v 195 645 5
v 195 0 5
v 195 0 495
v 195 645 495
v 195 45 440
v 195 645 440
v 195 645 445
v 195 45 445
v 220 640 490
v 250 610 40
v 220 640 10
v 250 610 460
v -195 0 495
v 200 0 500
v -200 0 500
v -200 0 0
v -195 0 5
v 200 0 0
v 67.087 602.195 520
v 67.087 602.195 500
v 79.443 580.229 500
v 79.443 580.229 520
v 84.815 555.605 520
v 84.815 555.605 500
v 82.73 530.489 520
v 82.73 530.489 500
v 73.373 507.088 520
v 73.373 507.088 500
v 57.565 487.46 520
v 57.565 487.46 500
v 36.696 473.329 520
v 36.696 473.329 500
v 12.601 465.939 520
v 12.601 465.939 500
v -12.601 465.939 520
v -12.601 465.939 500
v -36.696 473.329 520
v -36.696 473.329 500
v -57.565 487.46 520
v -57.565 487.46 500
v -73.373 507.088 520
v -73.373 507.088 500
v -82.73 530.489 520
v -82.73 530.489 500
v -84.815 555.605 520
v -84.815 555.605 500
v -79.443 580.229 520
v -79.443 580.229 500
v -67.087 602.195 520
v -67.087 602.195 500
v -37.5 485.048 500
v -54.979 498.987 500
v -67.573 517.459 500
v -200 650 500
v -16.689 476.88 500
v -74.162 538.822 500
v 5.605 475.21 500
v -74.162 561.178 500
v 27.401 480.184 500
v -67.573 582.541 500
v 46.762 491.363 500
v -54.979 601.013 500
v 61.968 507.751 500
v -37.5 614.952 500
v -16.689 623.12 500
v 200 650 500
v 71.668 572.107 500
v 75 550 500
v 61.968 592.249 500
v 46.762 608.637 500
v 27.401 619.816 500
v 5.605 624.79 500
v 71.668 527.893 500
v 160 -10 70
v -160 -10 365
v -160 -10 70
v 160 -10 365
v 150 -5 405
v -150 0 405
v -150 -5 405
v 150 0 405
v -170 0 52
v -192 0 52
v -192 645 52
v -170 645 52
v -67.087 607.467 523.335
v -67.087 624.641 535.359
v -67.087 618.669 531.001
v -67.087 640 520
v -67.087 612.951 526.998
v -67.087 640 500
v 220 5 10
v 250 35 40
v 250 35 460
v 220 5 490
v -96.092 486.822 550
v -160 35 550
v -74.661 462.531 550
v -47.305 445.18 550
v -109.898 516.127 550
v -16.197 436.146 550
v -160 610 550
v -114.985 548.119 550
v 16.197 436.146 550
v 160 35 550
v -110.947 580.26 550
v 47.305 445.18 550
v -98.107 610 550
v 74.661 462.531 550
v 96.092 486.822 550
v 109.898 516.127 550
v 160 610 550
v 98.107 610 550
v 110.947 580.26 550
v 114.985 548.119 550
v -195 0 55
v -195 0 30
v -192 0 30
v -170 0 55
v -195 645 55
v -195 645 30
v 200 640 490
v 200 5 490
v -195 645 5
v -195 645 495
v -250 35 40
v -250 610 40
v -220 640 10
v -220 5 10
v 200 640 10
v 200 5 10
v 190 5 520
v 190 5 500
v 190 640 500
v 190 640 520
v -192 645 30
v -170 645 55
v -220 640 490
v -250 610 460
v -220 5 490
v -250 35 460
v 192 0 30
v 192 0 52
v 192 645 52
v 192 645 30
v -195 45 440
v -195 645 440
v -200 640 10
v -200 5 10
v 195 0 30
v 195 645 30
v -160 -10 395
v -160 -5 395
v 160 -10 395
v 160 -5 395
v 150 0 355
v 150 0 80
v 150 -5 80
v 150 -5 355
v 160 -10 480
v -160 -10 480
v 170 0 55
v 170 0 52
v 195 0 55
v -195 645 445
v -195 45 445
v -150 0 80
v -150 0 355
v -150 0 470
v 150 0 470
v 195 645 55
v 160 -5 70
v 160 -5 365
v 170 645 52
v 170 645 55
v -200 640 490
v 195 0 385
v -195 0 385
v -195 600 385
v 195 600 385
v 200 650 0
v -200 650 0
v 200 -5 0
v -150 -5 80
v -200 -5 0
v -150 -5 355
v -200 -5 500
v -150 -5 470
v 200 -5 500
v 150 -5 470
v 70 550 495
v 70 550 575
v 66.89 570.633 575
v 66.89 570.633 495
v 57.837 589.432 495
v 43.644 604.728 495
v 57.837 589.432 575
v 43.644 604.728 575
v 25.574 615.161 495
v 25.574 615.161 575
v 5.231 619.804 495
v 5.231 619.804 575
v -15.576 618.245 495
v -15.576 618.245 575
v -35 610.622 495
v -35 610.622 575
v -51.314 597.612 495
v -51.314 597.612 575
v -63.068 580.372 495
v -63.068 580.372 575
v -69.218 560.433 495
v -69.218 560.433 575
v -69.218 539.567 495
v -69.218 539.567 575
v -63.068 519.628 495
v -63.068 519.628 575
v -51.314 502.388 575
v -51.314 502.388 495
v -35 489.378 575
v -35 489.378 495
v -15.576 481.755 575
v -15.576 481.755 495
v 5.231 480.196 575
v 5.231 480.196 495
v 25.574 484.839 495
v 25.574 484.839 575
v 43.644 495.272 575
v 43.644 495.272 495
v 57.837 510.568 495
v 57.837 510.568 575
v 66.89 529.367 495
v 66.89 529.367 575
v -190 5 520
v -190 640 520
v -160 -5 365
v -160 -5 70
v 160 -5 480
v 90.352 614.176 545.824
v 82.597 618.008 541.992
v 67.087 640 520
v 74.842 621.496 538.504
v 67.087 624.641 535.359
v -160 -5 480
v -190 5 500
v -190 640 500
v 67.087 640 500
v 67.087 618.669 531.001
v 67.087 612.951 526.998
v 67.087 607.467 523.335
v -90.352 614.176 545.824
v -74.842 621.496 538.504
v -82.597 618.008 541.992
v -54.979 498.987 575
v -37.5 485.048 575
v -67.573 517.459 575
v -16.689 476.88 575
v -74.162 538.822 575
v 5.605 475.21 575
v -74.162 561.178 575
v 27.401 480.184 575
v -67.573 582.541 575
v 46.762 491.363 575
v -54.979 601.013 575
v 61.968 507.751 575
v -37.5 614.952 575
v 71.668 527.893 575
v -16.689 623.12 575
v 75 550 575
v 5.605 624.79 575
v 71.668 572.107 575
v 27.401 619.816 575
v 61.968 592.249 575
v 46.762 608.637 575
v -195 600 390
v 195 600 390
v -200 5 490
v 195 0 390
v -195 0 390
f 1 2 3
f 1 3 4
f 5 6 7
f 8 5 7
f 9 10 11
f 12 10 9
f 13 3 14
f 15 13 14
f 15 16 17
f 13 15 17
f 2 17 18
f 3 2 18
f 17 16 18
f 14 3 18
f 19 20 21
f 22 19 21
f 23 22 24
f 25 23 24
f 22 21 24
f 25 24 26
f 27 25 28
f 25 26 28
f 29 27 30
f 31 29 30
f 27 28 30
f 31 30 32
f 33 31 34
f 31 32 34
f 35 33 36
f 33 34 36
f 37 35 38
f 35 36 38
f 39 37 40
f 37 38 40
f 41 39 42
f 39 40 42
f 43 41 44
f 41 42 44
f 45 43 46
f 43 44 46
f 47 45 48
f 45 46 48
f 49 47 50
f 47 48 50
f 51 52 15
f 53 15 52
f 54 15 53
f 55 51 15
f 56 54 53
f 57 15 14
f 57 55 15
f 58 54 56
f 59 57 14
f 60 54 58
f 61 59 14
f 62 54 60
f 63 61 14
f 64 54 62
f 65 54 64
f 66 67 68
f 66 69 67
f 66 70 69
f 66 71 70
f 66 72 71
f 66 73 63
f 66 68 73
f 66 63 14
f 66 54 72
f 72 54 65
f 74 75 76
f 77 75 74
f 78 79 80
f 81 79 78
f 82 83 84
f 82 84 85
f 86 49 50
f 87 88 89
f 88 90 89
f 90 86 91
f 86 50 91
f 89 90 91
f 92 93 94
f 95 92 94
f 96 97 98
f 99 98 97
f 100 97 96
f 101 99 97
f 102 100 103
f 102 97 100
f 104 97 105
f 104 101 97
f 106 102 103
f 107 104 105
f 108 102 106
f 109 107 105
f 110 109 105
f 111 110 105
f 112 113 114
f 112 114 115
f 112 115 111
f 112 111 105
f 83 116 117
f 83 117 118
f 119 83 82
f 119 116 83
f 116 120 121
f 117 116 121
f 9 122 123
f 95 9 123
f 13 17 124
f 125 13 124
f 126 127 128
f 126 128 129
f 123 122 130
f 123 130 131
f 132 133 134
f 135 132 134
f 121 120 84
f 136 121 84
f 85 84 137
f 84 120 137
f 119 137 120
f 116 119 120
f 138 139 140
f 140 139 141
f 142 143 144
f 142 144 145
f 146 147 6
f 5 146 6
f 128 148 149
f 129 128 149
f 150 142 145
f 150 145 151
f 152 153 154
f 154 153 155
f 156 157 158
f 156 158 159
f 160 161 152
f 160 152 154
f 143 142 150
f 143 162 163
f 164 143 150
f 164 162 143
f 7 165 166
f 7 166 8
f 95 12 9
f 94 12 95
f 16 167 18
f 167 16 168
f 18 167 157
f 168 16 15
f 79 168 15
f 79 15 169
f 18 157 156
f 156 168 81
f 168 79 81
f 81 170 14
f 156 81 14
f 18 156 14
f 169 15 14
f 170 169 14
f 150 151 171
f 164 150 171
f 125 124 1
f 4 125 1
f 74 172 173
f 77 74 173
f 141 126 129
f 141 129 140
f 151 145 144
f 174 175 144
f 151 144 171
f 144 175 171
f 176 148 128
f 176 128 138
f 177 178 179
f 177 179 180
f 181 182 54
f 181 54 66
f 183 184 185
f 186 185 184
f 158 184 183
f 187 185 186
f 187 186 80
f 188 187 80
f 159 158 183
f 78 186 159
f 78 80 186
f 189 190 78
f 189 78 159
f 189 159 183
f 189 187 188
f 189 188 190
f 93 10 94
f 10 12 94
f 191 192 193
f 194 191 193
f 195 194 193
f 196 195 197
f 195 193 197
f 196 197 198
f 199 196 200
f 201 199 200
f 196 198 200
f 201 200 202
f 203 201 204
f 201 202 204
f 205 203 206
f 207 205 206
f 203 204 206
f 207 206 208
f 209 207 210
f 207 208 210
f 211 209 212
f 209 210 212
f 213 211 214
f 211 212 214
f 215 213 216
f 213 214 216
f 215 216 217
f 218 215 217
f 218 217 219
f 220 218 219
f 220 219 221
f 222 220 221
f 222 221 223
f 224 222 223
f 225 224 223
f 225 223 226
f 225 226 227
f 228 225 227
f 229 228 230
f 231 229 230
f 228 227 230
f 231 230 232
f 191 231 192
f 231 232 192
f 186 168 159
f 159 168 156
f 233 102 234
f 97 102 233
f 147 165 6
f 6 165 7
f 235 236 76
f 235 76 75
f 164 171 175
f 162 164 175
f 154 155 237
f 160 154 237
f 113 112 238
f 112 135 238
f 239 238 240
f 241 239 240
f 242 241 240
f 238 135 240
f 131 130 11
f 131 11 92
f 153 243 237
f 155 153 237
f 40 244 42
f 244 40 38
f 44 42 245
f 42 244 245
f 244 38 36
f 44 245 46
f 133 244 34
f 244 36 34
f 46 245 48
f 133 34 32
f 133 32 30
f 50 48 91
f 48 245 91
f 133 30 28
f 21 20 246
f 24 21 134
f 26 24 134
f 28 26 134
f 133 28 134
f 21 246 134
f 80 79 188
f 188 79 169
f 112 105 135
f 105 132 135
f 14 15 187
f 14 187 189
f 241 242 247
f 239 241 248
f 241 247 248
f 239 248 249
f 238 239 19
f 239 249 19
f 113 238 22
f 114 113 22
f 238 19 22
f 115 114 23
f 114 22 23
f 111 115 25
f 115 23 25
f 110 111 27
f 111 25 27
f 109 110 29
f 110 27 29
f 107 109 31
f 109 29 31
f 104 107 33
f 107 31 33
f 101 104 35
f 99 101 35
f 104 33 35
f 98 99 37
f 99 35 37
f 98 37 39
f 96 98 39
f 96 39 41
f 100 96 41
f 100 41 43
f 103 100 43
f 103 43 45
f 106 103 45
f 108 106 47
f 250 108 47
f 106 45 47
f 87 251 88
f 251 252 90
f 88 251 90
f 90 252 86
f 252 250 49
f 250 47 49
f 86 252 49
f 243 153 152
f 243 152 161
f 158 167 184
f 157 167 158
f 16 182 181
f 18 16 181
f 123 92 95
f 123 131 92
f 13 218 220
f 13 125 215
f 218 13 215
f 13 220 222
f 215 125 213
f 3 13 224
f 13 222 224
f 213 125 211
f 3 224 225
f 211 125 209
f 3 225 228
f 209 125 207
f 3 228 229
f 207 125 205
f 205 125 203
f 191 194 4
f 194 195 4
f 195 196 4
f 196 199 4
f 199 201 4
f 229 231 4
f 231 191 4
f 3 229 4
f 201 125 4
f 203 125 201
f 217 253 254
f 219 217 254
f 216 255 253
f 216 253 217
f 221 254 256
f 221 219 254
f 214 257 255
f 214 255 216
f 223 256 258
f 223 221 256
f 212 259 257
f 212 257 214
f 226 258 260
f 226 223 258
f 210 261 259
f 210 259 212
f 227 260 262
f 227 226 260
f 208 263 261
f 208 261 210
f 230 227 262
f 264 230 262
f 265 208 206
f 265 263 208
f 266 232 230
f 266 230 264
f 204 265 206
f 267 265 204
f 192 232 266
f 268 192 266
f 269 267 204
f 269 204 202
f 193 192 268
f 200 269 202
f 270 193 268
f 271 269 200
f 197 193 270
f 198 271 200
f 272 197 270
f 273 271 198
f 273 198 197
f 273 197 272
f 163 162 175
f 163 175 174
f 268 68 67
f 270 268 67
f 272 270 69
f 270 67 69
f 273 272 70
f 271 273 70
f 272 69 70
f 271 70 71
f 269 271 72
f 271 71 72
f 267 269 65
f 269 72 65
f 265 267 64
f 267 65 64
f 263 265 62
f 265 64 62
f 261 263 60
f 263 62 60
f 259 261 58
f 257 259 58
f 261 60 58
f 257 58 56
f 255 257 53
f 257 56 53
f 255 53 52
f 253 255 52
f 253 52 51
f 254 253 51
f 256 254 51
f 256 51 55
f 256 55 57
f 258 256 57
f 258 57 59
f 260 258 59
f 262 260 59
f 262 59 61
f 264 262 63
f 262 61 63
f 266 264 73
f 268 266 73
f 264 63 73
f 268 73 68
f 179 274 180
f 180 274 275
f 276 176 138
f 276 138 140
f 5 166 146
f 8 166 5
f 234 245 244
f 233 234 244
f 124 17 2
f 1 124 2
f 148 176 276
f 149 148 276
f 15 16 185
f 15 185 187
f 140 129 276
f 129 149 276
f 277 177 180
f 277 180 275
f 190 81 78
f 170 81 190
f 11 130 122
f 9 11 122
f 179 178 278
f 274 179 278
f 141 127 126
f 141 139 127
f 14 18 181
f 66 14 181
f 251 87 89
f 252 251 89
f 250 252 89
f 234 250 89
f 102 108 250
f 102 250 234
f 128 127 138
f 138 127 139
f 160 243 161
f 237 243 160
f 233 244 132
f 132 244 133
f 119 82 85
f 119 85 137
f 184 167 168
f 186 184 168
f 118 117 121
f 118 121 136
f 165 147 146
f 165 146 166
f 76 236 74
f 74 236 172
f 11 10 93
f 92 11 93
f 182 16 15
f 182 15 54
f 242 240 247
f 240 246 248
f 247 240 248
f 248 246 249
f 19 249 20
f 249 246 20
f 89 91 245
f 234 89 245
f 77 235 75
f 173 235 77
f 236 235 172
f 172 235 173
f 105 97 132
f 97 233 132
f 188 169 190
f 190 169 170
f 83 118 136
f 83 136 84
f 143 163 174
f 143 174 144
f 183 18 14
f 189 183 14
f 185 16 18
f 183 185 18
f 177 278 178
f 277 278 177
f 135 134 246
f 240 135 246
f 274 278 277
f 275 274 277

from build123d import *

# Parameters (mm, degrees)
F1_W          = 400
F1_H          = 650
F2_DEPTH      = 500
F3_T          = -5
F4_W          = 390
F4_H          = 5
F5_DEPTH      = 600
F6_W          = 390
F6_H          = 5
F7_DEPTH      = 600
F9_DEPTH      = 645
F10_R         = 75
F11_DEPTH     = 75
F12_R         = 70
F13_DEPTH     = 80
F14_W         = 400
F14_H         = 500
F14_W_2       = 300
F14_H_2       = 275
F14_H_3       = 65
F15_DEPTH     = 5
F16_W         = 320
F16_H         = 85
F17_DEPTH     = 5
F16_H_2       = 295
F18_W         = 635
F18_H         = 480
F19_DEPTH     = 50
F22_DEPTH     = 50
F23_C1_SIZE   = 30
F23_C2_SIZE   = 30
F23_C3_SIZE   = 30
F23_C4_SIZE   = 30
F23_2_C1_SIZE = 30
F23_2_C2_SIZE = 30
F23_2_C3_SIZE = 30
F23_2_C4_SIZE = 30
F23_2_C5_SIZE = 30
F23_2_C6_SIZE = 30
F23_3_C1_SIZE = 30
F23_3_C2_SIZE = 30
F23_3_C3_SIZE = 30
F23_3_C4_SIZE = 30


with BuildPart() as f2:
    # F1 (on Top) → F2 (new body)
    with BuildSketch(Plane.XY):
        with Locations((0, 325)):
            Rectangle(F1_W, F1_H)
    extrude(amount=F2_DEPTH)

    # F3
    f3_openings = [f2.faces().sort_by_distance(p)[0] for p in [
        (0, 0, 250),
    ]]
    offset(amount=F3_T, openings=f3_openings)

    # F10 (on face) → F11 (join)
    with BuildSketch(Plane.XY.offset(500)):
        with Locations((0, 550)):
            Circle(F10_R)
    extrude(amount=F11_DEPTH)

    # F12 (on face) → F13 (cut, through all)
    with BuildSketch(Plane.XY.offset(575)):
        with Locations((0, 550)):
            Circle(F12_R)
    extrude(amount=-F13_DEPTH, mode=Mode.SUBTRACT)


with BuildPart() as f5:
    # F4 (on face) → F5 (new body)
    with BuildSketch(Plane.XZ.offset(-645)):
        with Locations((0, 442.5)):
            Rectangle(F4_W, F4_H)
    extrude(amount=F5_DEPTH)


with BuildPart() as f7:
    # F6 (on face) → F7 (new body)
    with BuildSketch(Plane.XZ):
        with Locations((0, 387.5)):
            Rectangle(F6_W, F6_H)
    extrude(amount=-F7_DEPTH)


with BuildPart() as f9:
    # F8 (on face) → F9 (new body, through all)
    with BuildSketch(Plane.XZ.offset(-645)):
        Polygon((-170, 52), (-170, 55), (-195, 55), (-195, 30), (-192, 30), (-192, 52), align=None)
    extrude(amount=F9_DEPTH)


with BuildPart() as f9b:
    # F8 (on face) → F9, piece 2 (new body, through all)
    with BuildSketch(Plane.XZ.offset(-645)):
        Polygon((192, 30), (195, 30), (195, 55), (170, 55), (170, 52), (192, 52), align=None)
    extrude(amount=F9_DEPTH)


with BuildPart() as f15:
    # F14 (on face) → F15 (new body)
    with BuildSketch(Plane.XZ):
        with Locations((0, 250)):
            Rectangle(F14_W, F14_H)
        with Locations((0, 217.5)):
            Rectangle(F14_W_2, F14_H_2, mode=Mode.SUBTRACT)
        with Locations((0, 437.5)):
            Rectangle(F14_W_2, F14_H_3, mode=Mode.SUBTRACT)
    extrude(amount=F15_DEPTH)


with BuildPart() as f17:
    # F16 (on face) → F17 (new body)
    with BuildSketch(Plane.XZ.offset(5)):
        with Locations((0, 437.5)):
            Rectangle(F16_W, F16_H)
    extrude(amount=F17_DEPTH)


with BuildPart() as f17b:
    # F16 (on face) → F17, piece 2 (new body)
    with BuildSketch(Plane.XZ.offset(5)):
        with Locations((0, 217.5)):
            Rectangle(F16_W, F16_H_2)
    extrude(amount=F17_DEPTH)


with BuildPart() as f19:
    # F18 (on face) → F19 (new body)
    with BuildSketch(Plane(origin=(-200, 0, 0), x_dir=(0, -1, 0), z_dir=(-1, 0, 0))):
        with Locations((-322.5, 250)):
            Rectangle(F18_W, F18_H)
    extrude(amount=F19_DEPTH)


with BuildPart() as f20_1:
    # F20: instance of F19
    add(f19.part.mirror(Plane.YZ))

    # F23#3: chamfer of 30 on 4 edges, made by hand

    # F23_3_c1
    f23_3_c1_edges = [f20_1.edges().sort_by_distance(p)[0] for p in [
        (250, 322.5, 490),
    ]]
    chamfer(f23_3_c1_edges, length=F23_3_C1_SIZE)

    # F23_3_c2
    f23_3_c2_edges = [f20_1.edges().sort_by_distance(p)[0] for p in [
        (250, 640, 235),
    ]]
    chamfer(f23_3_c2_edges, length=F23_3_C2_SIZE)

    # F23_3_c3
    f23_3_c3_edges = [f20_1.edges().sort_by_distance(p)[0] for p in [
        (250, 307.5, 10),
    ]]
    chamfer(f23_3_c3_edges, length=F23_3_C3_SIZE)

    # F23_3_c4
    f23_3_c4_edges = [f20_1.edges().sort_by_distance(p)[0] for p in [
        (250, 5, 250),
    ]]
    chamfer(f23_3_c4_edges, length=F23_3_C4_SIZE)


with BuildPart() as f22:
    # F21 (on face) → F22 (new body)
    with BuildSketch(Plane.XY.offset(500)):
        with BuildLine():
            Line((-67.0872659549, 640), (-190, 640))
            Line((-190, 640), (-190, 5))
            Line((-190, 5), (190, 5))
            Line((190, 5), (190, 640))
            Line((190, 640), (67.0872659549, 640))
            Line((67.0872659549, 640), (67.0872659549, 602.1948153239))
            ThreePointArc((67.0872659549, 602.1948153239), (0, 465), (-67.0872659549, 602.1948153239))
            Line((-67.0872659549, 602.1948153239), (-67.0872659549, 640))
        make_face()
    extrude(amount=F22_DEPTH)

    # F23#2: chamfer of 30 on 8 edges, made by hand

    # F23_2_c1
    f23_2_c1_edges = [f22.edges().sort_by_distance(p)[0] for p in [
        (-128.5436329775, 640, 550),
    ]]
    chamfer(f23_2_c1_edges, length=F23_2_C1_SIZE)

    # F23_2_c2
    f23_2_c2_edges = [f22.edges().sort_by_distance(p)[0] for p in [
        (-190, 307.5, 550),
    ]]
    chamfer(f23_2_c2_edges, length=F23_2_C2_SIZE)

    # F23_2_c3
    f23_2_c3_edges = [f22.edges().sort_by_distance(p)[0] for p in [
        (15, 5, 550),
    ]]
    chamfer(f23_2_c3_edges, length=F23_2_C3_SIZE)

    # F23_2_c4
    f23_2_c4_edges = [f22.edges().sort_by_distance(p)[0] for p in [
        (190, 337.5, 550),
    ]]
    chamfer(f23_2_c4_edges, length=F23_2_C4_SIZE)

    # F23_2_c5
    f23_2_c5_edges = [f22.edges().sort_by_distance(p)[0] for p in [
        (113.5436329775, 640, 550),
    ]]
    chamfer(f23_2_c5_edges, length=F23_2_C5_SIZE)

    # F23_2_c6
    f23_2_c6_edges = [f22.edges().sort_by_distance(p)[0] for p in [
        (0, 465, 550),
    ]]
    chamfer(f23_2_c6_edges, length=F23_2_C6_SIZE)


with BuildPart() as f19_1:
    add(f19.part)

    # F23: chamfer of 30 on 4 edges, made by hand

    # F23_c1
    f23_c1_edges = [f19_1.edges().sort_by_distance(p)[0] for p in [
        (-250, 322.5, 490),
    ]]
    chamfer(f23_c1_edges, length=F23_C1_SIZE)

    # F23_c2
    f23_c2_edges = [f19_1.edges().sort_by_distance(p)[0] for p in [
        (-250, 640, 235),
    ]]
    chamfer(f23_c2_edges, length=F23_C2_SIZE)

    # F23_c3
    f23_c3_edges = [f19_1.edges().sort_by_distance(p)[0] for p in [
        (-250, 307.5, 10),
    ]]
    chamfer(f23_c3_edges, length=F23_C3_SIZE)

    # F23_c4
    f23_c4_edges = [f19_1.edges().sort_by_distance(p)[0] for p in [
        (-250, 5, 250),
    ]]
    chamfer(f23_c4_edges, length=F23_C4_SIZE)


solid = Compound([f2.part, f5.part, f7.part, f9.part, f9b.part, f15.part, f17.part, f17b.part, f20_1.part, f22.part, f19_1.part])
